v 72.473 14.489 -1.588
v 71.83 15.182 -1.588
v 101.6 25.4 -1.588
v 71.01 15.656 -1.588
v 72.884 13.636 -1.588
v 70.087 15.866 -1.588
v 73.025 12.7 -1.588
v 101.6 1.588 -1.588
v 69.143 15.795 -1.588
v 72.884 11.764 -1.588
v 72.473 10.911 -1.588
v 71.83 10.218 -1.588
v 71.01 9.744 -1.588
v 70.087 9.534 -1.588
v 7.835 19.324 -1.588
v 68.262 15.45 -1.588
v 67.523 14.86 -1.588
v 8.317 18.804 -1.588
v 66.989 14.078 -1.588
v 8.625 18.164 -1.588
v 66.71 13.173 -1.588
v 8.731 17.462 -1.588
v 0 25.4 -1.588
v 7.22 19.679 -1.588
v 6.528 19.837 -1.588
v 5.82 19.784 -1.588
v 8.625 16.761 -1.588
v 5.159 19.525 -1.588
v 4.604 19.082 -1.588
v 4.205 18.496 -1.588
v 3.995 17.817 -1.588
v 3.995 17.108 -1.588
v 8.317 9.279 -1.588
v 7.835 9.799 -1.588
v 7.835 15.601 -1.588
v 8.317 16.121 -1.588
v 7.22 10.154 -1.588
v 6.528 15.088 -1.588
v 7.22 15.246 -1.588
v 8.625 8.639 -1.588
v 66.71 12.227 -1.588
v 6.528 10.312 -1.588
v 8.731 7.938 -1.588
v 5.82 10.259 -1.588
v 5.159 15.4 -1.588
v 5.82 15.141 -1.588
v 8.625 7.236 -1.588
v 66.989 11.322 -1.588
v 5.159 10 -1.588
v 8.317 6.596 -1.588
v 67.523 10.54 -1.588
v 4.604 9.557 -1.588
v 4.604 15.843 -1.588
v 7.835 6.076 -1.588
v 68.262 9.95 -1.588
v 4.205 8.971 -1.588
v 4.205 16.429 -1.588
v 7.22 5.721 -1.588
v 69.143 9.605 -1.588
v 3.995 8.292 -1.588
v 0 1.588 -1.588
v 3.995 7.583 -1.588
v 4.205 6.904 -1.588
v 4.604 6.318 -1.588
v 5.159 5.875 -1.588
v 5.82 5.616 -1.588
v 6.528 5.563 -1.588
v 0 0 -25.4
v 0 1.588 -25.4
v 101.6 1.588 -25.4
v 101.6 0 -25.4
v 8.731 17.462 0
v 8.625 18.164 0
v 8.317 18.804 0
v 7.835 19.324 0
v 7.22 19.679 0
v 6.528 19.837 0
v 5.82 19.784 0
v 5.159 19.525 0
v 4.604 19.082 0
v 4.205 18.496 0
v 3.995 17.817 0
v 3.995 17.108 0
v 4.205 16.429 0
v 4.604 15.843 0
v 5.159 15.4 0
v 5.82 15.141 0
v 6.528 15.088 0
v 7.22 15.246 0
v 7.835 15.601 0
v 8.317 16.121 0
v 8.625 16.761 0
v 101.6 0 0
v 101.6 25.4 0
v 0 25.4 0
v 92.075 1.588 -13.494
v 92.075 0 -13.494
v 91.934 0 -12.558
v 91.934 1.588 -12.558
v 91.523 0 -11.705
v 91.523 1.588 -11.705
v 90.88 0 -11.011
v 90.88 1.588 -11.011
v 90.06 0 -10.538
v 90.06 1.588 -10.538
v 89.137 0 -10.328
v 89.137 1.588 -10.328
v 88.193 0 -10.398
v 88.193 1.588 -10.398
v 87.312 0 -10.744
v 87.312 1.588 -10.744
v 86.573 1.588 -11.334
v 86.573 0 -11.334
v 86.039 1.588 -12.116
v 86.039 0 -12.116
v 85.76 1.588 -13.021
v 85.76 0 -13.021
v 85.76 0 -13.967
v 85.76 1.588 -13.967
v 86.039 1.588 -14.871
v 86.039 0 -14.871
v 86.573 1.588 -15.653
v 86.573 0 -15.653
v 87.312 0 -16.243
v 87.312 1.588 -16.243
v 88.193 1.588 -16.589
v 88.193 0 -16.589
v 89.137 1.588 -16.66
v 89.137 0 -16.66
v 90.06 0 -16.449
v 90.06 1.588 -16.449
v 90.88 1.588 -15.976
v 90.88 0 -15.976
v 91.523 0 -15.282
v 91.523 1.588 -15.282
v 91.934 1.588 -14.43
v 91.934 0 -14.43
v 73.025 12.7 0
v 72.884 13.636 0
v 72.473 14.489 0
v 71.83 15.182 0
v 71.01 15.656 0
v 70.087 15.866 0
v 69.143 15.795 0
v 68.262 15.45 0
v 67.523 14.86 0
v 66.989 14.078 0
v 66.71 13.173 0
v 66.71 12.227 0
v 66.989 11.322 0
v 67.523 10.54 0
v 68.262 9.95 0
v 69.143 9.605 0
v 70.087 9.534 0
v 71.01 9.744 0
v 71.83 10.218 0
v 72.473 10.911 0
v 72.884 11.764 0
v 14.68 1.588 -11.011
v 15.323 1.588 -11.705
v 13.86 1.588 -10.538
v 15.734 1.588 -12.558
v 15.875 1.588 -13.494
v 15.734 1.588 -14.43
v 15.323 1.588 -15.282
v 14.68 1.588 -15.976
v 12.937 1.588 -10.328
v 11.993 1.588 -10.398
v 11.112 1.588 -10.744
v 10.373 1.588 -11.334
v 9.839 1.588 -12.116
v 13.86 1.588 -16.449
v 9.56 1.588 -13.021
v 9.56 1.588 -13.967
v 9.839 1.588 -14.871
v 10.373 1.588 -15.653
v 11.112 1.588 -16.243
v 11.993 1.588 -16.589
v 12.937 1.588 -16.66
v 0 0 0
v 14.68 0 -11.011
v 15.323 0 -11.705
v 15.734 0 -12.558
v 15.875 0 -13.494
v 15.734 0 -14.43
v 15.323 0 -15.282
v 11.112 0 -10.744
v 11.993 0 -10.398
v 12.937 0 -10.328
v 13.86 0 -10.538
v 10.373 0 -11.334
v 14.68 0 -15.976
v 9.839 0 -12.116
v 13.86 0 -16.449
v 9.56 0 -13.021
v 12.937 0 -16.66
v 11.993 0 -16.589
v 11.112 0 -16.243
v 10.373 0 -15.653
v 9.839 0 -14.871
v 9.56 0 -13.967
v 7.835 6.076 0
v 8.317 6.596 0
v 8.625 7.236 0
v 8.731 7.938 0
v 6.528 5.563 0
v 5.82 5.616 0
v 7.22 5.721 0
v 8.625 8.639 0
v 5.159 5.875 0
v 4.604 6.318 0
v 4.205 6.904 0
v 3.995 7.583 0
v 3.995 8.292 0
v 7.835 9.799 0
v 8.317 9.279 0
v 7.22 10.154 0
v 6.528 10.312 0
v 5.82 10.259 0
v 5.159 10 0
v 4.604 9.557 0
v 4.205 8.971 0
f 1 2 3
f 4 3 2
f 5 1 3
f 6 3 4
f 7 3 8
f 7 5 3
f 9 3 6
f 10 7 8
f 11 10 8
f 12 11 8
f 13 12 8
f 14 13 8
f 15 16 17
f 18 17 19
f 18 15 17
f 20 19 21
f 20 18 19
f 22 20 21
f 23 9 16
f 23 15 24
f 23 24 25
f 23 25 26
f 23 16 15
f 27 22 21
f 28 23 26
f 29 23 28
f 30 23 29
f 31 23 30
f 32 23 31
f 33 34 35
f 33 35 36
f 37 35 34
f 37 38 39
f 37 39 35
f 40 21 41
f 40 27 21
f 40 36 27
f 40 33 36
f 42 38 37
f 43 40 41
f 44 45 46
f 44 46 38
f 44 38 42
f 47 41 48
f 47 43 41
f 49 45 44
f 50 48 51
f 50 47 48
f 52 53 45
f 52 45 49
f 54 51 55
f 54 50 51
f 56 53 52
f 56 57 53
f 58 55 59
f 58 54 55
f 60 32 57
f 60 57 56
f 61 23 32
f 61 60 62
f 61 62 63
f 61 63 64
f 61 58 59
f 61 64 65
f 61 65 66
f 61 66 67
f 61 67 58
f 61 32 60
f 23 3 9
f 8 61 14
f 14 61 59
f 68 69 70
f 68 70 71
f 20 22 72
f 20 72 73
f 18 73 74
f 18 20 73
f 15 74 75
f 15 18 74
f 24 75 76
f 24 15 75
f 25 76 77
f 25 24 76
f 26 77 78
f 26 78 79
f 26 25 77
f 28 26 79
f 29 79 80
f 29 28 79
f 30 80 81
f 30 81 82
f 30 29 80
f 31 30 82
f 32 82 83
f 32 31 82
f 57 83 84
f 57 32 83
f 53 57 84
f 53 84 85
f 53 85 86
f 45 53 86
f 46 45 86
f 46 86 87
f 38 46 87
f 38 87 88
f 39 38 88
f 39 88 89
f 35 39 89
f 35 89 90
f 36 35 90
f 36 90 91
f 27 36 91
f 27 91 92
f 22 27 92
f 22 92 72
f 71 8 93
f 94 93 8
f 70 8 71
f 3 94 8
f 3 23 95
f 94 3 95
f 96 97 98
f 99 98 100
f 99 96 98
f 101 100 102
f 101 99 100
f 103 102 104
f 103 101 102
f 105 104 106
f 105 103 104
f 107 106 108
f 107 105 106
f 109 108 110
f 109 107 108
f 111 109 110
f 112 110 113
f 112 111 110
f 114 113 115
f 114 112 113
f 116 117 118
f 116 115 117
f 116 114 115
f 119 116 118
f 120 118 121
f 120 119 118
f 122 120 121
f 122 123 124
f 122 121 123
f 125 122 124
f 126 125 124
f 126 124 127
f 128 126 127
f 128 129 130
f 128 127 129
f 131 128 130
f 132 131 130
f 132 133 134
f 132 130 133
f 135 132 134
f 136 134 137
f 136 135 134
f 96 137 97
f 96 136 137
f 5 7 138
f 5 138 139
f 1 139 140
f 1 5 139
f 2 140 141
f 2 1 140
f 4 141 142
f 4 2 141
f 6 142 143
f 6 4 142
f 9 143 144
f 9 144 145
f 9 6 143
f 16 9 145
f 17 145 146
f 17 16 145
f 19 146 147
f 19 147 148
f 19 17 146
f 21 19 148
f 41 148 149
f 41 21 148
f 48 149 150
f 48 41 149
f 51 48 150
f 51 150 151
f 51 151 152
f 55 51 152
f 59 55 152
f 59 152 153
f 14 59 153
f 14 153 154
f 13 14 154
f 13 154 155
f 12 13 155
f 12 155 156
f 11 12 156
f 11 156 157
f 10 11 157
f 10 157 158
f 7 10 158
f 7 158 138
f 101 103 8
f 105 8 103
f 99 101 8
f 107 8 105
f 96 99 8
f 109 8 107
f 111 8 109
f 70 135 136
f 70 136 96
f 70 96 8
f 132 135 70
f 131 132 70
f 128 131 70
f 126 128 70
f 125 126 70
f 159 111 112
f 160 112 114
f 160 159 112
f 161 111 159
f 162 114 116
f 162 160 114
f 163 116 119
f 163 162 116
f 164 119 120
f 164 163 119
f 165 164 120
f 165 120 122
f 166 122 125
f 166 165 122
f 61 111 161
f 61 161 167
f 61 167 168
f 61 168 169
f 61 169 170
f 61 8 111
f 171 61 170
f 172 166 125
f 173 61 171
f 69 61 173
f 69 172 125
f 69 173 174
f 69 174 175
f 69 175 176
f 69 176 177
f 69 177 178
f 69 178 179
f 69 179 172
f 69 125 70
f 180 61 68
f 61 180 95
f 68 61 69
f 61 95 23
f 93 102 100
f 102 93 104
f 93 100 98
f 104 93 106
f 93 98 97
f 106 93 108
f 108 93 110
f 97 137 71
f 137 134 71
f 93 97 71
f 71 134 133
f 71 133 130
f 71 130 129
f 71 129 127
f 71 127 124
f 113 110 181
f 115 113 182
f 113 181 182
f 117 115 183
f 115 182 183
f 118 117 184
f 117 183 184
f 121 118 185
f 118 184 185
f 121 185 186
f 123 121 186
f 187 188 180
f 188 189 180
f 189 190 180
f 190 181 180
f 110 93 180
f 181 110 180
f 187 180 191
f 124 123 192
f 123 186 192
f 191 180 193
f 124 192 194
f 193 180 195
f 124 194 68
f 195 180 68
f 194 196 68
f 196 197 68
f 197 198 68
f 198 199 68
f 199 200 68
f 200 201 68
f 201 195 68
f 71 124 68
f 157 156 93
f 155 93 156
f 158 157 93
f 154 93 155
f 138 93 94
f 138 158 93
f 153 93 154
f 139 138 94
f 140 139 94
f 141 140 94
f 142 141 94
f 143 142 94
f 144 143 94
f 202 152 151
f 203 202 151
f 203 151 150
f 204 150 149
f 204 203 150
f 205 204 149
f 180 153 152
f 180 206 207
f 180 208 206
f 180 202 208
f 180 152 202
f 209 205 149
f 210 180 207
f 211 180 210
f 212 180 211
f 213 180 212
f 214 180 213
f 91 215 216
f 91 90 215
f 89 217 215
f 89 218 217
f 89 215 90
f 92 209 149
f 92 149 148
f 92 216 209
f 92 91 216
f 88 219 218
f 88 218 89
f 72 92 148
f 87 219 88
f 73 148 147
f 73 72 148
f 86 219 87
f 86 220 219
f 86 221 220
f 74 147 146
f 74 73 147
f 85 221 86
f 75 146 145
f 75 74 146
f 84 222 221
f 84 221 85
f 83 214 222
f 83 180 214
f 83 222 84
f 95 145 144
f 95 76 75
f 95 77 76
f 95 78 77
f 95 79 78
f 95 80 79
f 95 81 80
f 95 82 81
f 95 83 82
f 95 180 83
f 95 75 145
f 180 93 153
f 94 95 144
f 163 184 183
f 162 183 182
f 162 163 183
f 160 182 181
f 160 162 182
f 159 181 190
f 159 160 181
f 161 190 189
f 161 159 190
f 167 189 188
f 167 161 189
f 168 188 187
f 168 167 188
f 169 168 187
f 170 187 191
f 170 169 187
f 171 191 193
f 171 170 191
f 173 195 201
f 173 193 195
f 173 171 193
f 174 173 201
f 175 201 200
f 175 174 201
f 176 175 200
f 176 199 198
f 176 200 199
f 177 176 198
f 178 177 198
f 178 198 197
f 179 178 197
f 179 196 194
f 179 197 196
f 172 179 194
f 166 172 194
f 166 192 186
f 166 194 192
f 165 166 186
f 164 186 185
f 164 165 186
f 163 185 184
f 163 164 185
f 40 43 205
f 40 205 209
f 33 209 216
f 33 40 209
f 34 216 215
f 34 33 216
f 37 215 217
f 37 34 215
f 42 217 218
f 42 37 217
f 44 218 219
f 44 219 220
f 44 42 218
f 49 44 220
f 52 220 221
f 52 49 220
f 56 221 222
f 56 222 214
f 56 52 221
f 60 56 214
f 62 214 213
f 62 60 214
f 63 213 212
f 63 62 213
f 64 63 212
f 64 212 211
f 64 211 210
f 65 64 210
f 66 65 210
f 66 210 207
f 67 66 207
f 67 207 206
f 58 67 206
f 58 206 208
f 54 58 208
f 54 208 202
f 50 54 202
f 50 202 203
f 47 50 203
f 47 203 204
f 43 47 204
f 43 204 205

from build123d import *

# Parameters (mm, degrees)
BOSS_EXTRUDE1_DEPTH = 101.6
SKETCH2_R           = 3.175
CUT_EXTRUDE1_DEPTH  = 101.6
SKETCH3_R           = 3.175
SKETCH3_R_2         = 2.38125
CUT_EXTRUDE2_DEPTH  = 101.6
SKETCH4_W           = 29.676804306
SKETCH4_H           = 30.942193328
CUT_EXTRUDE3_DEPTH  = 101.6


with BuildPart() as part:
    # Sketch1 → Boss-Extrude1 (new body)
    with BuildSketch(Plane(origin=(0, 0, 0), x_dir=(0, 0, -1), z_dir=(1, 0, 0))):
        Polygon((0, 0), (0, 25.4), (-1.5875, 25.4), (-1.5875, 1.5875), (-25.4, 1.5875), (-25.4, 0), align=None)
    boss_extrude1 = extrude(amount=BOSS_EXTRUDE1_DEPTH)

    # Sketch2 → Cut-Extrude1 (cut)
    with BuildSketch(Plane(origin=(0, 1.5875, 0), x_dir=(1, 0, 0), z_dir=(0, 1, 0))):
        with Locations((12.7, -13.49375)):
            Circle(SKETCH2_R)
        with Locations((88.9, -13.49375)):
            Circle(SKETCH2_R)
    cut_extrude1 = extrude(amount=-CUT_EXTRUDE1_DEPTH, mode=Mode.SUBTRACT)

    # Sketch3 → Cut-Extrude2 (cut)
    with BuildSketch(Plane.XY.offset(1.5875)):
        with Locations((69.85, 12.7)):
            Circle(SKETCH3_R)
        with Locations((6.35, 17.4625)):
            Circle(SKETCH3_R_2)
        with Locations((6.35, 7.9375)):
            Circle(SKETCH3_R_2)
    cut_extrude2 = extrude(amount=-CUT_EXTRUDE2_DEPTH, mode=Mode.SUBTRACT)

    # Mirror1: Boss-Extrude1, Cut-Extrude1, Cut-Extrude2 across plane
    add(boss_extrude1.mirror(Plane(origin=(101.6, 0, 0), x_dir=(1, 0, 0), z_dir=(0, 0, 1))))
    add(cut_extrude1.mirror(Plane(origin=(101.6, 0, 0), x_dir=(1, 0, 0), z_dir=(0, 0, 1))), mode=Mode.SUBTRACT)
    add(cut_extrude2.mirror(Plane(origin=(101.6, 0, 0), x_dir=(1, 0, 0), z_dir=(0, 0, 1))), mode=Mode.SUBTRACT)

    # Sketch4 → Cut-Extrude3 (cut)
    with BuildSketch(Plane.ZY):
        with Locations((14.838402153, 15.471096664)):
            Rectangle(SKETCH4_W, SKETCH4_H)
    extrude(amount=-CUT_EXTRUDE3_DEPTH, mode=Mode.SUBTRACT)


solid = part.part
